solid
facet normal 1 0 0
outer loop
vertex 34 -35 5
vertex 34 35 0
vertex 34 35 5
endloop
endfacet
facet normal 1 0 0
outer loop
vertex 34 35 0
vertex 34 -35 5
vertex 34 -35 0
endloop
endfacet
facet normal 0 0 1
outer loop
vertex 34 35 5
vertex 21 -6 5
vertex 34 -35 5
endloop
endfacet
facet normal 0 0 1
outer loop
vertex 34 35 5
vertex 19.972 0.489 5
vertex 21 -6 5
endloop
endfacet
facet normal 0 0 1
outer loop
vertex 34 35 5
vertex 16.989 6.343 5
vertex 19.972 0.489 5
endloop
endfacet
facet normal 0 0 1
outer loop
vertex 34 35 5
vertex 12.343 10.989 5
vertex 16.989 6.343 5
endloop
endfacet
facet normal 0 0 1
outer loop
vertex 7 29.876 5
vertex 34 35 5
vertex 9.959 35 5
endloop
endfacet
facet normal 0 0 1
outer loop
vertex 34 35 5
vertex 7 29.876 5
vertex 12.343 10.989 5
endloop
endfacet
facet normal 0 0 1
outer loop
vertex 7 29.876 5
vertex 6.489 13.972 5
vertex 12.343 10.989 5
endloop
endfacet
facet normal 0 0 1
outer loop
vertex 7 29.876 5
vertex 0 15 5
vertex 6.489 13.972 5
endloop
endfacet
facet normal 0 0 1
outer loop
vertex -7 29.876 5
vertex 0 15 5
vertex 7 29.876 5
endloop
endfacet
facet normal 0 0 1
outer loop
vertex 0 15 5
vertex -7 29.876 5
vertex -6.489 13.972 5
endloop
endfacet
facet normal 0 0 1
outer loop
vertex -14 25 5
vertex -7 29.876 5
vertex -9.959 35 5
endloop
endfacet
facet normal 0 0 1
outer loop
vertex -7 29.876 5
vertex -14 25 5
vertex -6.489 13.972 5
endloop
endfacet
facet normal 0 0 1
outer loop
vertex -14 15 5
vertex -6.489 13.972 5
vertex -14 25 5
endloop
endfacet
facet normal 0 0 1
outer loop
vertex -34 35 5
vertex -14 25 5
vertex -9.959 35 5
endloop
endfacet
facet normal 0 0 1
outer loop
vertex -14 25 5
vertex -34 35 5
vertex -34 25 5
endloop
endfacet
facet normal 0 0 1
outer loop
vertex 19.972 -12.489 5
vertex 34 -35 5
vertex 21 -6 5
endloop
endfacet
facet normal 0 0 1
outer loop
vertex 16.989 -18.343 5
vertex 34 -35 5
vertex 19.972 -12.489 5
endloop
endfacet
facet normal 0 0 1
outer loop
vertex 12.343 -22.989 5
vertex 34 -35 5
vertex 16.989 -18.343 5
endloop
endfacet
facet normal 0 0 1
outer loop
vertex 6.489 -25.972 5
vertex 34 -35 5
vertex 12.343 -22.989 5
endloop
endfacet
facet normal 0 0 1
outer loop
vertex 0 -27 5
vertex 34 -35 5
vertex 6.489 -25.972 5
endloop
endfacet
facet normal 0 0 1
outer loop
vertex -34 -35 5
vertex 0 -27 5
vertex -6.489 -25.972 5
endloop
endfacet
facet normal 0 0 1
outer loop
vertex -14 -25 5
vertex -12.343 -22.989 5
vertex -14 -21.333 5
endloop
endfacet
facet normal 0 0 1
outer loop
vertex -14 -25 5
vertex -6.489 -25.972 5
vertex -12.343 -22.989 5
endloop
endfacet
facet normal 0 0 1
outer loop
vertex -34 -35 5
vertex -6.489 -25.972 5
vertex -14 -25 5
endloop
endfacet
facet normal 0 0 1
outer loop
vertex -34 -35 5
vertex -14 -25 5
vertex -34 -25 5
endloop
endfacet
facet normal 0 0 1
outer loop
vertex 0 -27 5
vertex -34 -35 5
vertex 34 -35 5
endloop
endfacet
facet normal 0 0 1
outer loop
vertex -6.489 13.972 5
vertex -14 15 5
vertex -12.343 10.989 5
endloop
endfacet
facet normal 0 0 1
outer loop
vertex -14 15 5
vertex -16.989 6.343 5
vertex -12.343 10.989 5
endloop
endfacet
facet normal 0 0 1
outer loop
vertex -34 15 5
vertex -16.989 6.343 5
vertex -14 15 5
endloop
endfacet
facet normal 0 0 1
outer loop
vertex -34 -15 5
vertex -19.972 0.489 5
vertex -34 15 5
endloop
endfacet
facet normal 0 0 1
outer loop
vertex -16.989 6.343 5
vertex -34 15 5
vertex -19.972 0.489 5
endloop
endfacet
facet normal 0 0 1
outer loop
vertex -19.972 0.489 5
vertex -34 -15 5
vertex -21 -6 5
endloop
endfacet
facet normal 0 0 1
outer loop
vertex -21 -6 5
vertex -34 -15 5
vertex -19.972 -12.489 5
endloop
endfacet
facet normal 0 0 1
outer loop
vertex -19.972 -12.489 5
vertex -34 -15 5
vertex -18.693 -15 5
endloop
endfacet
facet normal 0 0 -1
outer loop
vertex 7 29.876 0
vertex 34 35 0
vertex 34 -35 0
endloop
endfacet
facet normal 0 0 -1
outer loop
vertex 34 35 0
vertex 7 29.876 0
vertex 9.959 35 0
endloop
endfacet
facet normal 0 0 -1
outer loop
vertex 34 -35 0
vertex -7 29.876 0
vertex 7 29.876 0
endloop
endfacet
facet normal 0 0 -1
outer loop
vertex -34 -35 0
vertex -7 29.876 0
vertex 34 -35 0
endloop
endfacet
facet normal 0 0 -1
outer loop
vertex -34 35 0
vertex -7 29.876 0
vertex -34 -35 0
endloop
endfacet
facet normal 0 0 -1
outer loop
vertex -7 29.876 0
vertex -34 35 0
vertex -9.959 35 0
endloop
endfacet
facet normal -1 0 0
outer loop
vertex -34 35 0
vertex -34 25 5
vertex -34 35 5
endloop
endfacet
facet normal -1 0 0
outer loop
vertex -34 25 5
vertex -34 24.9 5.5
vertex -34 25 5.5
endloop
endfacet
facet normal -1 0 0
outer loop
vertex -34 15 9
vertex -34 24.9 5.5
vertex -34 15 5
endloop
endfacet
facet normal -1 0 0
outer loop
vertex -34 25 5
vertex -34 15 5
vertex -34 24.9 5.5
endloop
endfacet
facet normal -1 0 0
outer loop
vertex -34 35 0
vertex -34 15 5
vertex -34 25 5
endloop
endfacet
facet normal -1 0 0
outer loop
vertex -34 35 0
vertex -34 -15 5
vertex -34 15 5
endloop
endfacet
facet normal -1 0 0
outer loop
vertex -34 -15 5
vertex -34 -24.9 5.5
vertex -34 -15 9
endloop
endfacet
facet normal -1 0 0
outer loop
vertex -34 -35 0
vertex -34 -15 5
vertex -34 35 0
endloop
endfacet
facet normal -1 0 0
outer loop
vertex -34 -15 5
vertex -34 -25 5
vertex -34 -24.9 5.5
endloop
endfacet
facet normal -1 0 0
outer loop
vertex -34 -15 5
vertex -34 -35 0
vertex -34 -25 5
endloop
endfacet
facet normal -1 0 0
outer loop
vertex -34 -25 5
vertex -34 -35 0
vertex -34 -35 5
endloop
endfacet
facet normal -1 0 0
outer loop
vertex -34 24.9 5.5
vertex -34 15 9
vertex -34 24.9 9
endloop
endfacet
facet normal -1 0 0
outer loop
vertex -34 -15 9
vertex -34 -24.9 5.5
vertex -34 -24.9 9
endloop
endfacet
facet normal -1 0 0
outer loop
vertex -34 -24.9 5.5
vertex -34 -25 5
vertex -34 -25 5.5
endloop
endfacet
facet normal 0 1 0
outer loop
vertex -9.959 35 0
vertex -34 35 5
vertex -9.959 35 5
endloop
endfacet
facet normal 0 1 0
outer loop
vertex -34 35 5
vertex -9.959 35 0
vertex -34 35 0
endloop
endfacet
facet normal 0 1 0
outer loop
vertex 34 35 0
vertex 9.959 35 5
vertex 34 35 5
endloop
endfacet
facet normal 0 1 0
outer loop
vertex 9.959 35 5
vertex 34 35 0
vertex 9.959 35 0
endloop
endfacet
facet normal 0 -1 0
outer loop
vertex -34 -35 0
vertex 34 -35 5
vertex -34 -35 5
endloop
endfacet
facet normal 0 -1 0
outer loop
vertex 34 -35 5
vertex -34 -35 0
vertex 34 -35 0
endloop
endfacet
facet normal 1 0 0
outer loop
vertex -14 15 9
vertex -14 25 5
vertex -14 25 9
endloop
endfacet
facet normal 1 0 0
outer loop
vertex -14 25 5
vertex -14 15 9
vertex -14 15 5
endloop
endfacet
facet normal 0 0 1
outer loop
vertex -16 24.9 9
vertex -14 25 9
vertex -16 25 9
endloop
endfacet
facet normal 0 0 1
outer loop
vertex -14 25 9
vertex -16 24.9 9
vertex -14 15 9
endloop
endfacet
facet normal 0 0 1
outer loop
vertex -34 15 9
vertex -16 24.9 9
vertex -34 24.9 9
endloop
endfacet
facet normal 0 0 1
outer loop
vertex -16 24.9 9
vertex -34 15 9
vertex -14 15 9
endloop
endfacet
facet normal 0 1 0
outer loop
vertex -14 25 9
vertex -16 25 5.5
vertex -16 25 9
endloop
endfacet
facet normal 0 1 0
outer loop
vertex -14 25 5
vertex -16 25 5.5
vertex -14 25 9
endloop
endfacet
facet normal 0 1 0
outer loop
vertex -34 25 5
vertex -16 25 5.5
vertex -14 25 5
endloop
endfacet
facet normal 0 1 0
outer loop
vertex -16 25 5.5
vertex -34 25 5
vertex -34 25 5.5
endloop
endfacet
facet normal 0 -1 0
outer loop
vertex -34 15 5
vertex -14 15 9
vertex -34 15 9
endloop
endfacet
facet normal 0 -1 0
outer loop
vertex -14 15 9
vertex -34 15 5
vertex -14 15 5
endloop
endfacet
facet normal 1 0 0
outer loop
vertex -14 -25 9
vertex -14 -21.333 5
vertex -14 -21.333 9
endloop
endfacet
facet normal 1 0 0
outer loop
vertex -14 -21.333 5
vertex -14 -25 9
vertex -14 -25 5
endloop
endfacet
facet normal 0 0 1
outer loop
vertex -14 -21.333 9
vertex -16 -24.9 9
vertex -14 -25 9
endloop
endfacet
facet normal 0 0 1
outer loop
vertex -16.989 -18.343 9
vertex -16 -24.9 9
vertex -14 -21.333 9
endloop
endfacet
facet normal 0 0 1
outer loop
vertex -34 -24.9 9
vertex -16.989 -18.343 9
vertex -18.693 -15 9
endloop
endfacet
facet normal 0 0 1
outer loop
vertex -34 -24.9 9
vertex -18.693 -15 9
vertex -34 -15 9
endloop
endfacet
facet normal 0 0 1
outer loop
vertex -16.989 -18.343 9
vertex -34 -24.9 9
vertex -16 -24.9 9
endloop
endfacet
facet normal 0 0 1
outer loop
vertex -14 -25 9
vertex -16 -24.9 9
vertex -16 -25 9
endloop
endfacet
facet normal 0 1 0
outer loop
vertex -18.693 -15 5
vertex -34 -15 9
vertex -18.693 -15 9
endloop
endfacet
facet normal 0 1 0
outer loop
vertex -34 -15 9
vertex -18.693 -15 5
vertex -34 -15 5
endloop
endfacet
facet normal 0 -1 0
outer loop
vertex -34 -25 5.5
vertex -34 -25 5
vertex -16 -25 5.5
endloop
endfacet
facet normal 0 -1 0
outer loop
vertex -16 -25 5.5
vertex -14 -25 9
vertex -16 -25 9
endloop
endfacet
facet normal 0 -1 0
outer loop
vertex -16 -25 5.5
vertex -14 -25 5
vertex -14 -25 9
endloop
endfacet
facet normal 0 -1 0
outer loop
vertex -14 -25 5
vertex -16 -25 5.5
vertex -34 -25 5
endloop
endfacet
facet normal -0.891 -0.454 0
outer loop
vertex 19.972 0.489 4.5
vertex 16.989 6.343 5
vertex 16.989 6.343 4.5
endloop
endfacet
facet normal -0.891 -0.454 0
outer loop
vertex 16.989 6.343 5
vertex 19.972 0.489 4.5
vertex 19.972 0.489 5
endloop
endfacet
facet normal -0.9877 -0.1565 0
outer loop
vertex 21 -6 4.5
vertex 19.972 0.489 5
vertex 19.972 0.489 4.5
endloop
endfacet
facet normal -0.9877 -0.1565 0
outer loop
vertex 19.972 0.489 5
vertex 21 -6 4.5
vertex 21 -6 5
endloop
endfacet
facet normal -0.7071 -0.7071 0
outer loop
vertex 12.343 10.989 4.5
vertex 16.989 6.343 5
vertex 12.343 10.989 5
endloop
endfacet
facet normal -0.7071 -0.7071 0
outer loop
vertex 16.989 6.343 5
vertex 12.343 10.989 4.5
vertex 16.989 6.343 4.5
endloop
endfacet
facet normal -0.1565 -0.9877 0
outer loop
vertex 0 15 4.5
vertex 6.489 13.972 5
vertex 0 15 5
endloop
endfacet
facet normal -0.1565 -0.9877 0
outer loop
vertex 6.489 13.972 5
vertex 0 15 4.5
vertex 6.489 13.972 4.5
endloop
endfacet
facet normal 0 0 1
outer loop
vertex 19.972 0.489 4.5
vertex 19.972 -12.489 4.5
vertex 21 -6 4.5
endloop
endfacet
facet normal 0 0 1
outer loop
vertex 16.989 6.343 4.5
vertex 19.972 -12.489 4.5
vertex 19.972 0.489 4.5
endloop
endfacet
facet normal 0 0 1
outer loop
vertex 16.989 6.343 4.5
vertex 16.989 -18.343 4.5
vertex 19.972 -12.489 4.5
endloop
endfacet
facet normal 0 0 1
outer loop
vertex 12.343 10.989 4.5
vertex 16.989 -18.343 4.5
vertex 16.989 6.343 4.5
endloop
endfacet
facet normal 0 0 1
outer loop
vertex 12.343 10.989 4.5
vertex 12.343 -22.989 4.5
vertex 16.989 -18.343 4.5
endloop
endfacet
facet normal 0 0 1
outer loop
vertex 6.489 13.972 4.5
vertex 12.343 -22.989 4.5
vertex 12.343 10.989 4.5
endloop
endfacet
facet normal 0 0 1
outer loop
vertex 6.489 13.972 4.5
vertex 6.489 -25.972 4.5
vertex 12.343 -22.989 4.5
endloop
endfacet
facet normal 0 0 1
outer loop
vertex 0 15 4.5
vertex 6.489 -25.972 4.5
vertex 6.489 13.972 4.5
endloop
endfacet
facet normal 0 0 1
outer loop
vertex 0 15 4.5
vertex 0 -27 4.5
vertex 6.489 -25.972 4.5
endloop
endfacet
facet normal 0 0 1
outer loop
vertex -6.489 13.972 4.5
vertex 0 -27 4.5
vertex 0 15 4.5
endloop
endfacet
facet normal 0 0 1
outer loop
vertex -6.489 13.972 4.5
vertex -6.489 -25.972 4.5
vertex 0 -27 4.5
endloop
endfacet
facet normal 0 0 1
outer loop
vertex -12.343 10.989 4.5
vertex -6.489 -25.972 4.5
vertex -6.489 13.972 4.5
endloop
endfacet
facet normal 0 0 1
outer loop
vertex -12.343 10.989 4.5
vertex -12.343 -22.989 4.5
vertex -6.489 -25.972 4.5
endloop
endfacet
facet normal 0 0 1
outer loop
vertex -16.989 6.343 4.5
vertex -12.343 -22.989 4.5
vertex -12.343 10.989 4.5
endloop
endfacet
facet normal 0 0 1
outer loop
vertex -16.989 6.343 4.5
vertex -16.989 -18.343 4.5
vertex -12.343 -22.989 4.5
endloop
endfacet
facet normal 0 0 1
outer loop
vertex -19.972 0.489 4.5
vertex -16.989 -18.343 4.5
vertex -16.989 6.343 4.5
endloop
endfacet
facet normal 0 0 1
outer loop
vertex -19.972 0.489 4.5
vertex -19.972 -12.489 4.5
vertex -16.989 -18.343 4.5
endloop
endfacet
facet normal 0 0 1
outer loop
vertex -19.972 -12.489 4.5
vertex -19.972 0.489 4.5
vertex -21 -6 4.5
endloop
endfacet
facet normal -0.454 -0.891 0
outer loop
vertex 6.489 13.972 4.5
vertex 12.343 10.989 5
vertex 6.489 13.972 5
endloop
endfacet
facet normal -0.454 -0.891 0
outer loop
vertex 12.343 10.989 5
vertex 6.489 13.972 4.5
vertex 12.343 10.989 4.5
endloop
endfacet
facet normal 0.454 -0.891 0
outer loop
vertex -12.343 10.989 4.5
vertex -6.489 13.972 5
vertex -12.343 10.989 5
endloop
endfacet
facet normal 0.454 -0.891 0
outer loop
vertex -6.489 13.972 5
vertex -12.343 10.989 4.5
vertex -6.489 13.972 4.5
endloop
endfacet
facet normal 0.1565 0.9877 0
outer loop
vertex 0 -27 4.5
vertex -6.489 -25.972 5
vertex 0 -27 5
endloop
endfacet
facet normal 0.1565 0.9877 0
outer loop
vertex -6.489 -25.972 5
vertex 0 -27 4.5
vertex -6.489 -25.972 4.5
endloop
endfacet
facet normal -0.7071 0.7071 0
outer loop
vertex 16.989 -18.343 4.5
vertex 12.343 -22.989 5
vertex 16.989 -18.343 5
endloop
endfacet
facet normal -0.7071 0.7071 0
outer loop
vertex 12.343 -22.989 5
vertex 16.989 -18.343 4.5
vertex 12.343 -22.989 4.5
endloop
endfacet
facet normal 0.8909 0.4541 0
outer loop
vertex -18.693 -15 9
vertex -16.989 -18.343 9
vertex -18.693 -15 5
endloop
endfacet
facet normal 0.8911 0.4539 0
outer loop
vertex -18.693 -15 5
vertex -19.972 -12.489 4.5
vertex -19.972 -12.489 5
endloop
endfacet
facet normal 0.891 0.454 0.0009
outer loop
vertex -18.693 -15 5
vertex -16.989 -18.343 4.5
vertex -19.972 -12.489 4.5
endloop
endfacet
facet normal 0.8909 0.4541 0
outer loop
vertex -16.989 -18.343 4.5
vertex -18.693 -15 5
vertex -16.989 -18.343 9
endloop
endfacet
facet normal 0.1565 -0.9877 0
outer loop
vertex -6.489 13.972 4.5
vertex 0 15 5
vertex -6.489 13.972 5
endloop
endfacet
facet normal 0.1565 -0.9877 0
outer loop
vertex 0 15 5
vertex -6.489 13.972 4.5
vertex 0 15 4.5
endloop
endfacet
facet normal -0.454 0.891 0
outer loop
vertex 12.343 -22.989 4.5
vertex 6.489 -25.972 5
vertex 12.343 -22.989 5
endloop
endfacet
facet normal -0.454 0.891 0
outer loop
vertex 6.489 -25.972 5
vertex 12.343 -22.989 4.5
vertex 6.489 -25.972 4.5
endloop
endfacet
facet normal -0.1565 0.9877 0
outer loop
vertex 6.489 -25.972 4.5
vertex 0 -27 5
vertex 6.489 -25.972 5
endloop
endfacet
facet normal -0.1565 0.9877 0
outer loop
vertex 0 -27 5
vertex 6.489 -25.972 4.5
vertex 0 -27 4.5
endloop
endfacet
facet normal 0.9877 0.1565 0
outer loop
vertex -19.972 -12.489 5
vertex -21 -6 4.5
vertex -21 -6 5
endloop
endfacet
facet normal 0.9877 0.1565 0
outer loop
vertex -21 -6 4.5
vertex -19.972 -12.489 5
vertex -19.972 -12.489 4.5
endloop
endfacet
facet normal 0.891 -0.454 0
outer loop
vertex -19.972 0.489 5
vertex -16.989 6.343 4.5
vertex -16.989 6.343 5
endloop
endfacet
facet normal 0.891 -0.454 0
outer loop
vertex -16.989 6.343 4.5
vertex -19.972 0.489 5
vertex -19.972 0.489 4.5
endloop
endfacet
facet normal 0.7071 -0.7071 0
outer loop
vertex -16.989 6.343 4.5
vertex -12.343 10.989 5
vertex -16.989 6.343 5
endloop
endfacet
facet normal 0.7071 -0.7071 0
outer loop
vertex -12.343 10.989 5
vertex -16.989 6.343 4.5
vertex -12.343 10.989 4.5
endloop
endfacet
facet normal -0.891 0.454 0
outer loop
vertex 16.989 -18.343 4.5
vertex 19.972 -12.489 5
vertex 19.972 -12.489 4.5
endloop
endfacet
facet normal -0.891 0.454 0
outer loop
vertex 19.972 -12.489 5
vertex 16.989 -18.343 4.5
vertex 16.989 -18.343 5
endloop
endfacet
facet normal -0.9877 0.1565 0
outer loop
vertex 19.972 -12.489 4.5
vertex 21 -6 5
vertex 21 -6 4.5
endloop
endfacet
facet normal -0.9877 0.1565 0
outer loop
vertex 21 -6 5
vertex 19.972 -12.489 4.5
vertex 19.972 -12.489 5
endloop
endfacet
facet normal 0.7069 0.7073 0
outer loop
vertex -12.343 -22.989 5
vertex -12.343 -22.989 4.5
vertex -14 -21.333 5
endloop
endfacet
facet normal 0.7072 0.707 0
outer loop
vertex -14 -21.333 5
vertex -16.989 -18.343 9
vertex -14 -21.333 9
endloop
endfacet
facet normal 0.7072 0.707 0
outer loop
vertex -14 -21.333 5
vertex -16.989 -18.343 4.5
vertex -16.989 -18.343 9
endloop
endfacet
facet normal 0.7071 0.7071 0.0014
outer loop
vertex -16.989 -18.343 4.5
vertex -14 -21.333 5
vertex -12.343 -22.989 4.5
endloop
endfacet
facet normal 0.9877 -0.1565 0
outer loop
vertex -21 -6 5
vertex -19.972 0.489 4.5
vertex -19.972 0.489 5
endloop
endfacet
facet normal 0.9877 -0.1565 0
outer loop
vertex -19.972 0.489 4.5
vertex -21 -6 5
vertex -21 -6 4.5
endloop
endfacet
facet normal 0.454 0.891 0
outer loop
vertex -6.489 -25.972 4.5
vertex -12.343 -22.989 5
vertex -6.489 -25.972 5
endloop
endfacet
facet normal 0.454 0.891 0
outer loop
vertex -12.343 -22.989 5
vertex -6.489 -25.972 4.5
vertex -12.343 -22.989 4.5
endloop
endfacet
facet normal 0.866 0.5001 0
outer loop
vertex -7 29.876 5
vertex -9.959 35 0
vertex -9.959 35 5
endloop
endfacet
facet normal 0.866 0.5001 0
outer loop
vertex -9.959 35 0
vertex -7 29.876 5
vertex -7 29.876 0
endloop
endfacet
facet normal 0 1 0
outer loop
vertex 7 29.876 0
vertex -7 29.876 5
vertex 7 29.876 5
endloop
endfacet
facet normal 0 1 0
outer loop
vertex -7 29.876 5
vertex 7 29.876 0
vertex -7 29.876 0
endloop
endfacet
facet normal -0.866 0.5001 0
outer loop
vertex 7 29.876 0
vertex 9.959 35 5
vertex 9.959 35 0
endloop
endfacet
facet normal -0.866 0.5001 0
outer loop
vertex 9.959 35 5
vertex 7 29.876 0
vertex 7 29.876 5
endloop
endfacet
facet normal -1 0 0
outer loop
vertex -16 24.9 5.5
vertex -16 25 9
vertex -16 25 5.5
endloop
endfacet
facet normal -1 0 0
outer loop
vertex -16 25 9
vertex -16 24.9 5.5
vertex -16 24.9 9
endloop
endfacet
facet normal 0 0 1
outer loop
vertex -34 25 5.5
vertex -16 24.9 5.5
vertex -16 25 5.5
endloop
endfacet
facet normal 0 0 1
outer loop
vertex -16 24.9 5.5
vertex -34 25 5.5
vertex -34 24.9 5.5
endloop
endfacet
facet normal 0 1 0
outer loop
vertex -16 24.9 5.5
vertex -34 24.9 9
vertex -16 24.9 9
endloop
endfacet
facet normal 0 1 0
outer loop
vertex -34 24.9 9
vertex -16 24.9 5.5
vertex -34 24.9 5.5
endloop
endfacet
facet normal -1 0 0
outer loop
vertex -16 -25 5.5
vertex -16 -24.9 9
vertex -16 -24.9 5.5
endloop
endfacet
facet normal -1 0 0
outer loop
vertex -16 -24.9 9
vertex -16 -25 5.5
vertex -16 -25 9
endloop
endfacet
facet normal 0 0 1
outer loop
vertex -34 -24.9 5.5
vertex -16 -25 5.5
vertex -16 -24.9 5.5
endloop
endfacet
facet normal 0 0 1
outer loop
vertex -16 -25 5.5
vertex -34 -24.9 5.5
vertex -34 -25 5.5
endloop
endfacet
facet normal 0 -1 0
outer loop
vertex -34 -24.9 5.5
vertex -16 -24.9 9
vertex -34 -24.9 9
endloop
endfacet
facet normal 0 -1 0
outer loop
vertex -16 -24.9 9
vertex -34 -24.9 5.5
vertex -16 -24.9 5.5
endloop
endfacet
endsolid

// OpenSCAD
// file: configuration-metric.scad
// PRUSA Mendel  
// Metric Configuration file
// GNU GPL v2
// Josef Průša
// josefprusa@me.com
// prusadjs.cz
// http://www.reprap.org/wiki/Prusa_Mendel
// http://github.com/prusajr/PrusaMendel

// CONFIGURATION FILE FOR METRIC VARIANT OF PRUSA MENDEL

// M8 rod diameter
m8_diameter = 8.4;

// M8 nut diameter diameter
// Used for $fn nut trick -> cylinder(h = 5, r=m8_nut_diameter, $fn=6, center=true);
m8_nut_diameter = 16.4;

// M4 rod/screw diameter
m4_diameter = 5;

// M4 nut diameter
// Used for $fn nut trick -> cylinder(h = 5, r=m4_nut_diameter, $fn=6, center=true);
m4_nut_diameter = 9;

// M3 rod/screw diameter
m3_diameter = 4.4;

// M3 nut diameter diameter
// Used for $fn nut trick -> cylinder(h = 5, r=m3_nut_diameter, $fn=6, center=true);
m3_nut_diameter = 7;

// Bushing holders diameter
bushing_diameter = 11;

//Motor shaft diameter
motor_shaft=5;

//Bushings
	//Size of rod on which it will slide
	bushing_rodsize = 8;
	
	//Size of whole bushings (diameter because the core is cylinder)
	bushing_outerDiameter = 16;
	
	//How long they are going to be
	bushing_lenght = 11;
	
	// TYPE Can generate three versions
	// 1 - regular old ones
	// 2 - helical ones
	// 3 - holders for brass or any other bought bushings
	bushing_type = 2;
// file: configuration.scad
// PRUSA Mendel  
// Configuration file
// GNU GPL v2
// Josef Průša
// josefprusa@me.com
// prusadjs.cz
// http://www.reprap.org/wiki/Prusa_Mendel
// http://github.com/prusajr/PrusaMendel

// PLESE SELECT ONE OF THE CONFIGURATION FILES
// BY UN-COMMENTING IT

// METRIC VERSION
include <configuration-metric.scad>

// IMPERIAL VERSION (TODO, just place holder)
// Spacexula will do it ;-)
// include <configuration-imperial.scad>

// MINI-HUXLEY VERSION (TODO, just place holder)
// include <configuration-huxley.scad>

// MEGA VERSION (TODO, just place holder)
// include <configuration-mega.scad>
// main file
// PRUSA Mendel  
// X-carriage
// Used for sliding on X axis
// GNU GPL v2
// Josef Průša
// josefprusa@me.com
// prusadjs.cz
// http://www.reprap.org/wiki/Prusa_Mendel
// http://github.com/prusajr/PrusaMendel

include <configuration.scad>

/**
 * @name load tester
 * @using 4 bushing
 * @id loadtester
 */
module xcarriage(){


translate(v = [0,0,2.5]) union(){difference(){
	union(){
		//Base block
			cube(size = [68,70,5], center = true);
		//Nut holder base - extruder
			//translate(v = [0, 0, 1]) cube(size = [12,70,7], center = true);
			//translate(v = [0, -6, 1]) cube(size = [68,12,7], center = true);

		//Nut holder base - belt clamps
		//translate(v = [33-(7.5/2), -18, 1]) cube(size = [45-7.5,15,7], center = true);
		//translate(v = [33+45/2-7.5, -18, 1]) cylinder(h = 7, r=7.5, $fn=18, center=true);
		//translate(v = [33-(7.5/2), 18, 1]) cube(size = [45-7.5,15,7], center = true);
		//translate(v = [33+45/2-7.5, 18, 1]) cylinder(h = 7, r=7.5, $fn=18, center=true);

		//Bushing holder
		//translate(v = [-23, 30, 5])cube(size = [22,10,15], center = true);
		//translate(v = [-23, -30, 5])cube(size = [22,10,15], center = true);
		//translate(v = [23, -30, 5])cube(size = [22,10,15], center = true);
		//translate(v = [23, 30, 5])cube(size = [22,10,15], center = true);
		
		// fan holder
		translate(v = [-24, 20, 2])  cube(size = [20,10,9], center = true);
		translate(v = [-24, -20, 2]) cube(size = [20,10,9], center = true);

	}
	//round corners
	//translate([-34,-35.1,-10]) roundcorner(round_corner_diameter/2);
	//translate([34,-35.1,-10]) rotate(a=90, v=[0,0,1]) roundcorner(round_corner_diameter/2);

	//translate([-34,35.1,-10]) rotate(a=270, v=[0,0,1]) roundcorner(round_corner_diameter/2);
	//translate([34,35.1,-10]) rotate(a=-180, v=[0,0,1]) roundcorner(round_corner_diameter/2);
	
	translate([0,42])cylinder(r=14,h=10,center=true,$fn=6);
translate([0,-6, -4])rotate(a=90, v=[0,0,1])linear_extrude(file = "mdf_half_disk.dxf", 
                     layer = "holes", height = 10, 
                     convexity = 2, $fn=10);
	//main cutout
	//translate(v = [-12.5,0,0]) cube(size = [5,50,10], center = true);

	translate(v = [25.5, 30.4, 8])cube(size = [19,11,10], center = true);
	translate(v = [-25.5, 30.4, 8])cube(size = [19,11,10], center = true);
	translate(v = [25.5, -30.4, 8])cube(size = [19,11,10], center = true);
	translate(v = [-25.5, -30.4, 8])cube(size = [19,11,10], center = true);

	// holes for connecting extruder
		translate(v = [0, 0, 0]) {
		
		translate(v = [-40, -31, 2]) #cylinder(h = 10, r=m4_diameter/2, $fn=9, center=true);
		translate(v = [-40, -31, 5]) #cylinder(h = 9, r=m4_nut_diameter/2, $fn=6, center=true);
		translate(v = [-40, 19, ]) #cylinder(h = 20, r=m4_diameter/2, $fn=9, center=true);
		translate(v = [-40, 19, 5]) #cylinder(h = 9, r=4.5, $fn=6, center=true);
		
		// Hotend hole
		translate(v = [0, -6, 12]) cylinder(h = 20, r=21, $fn=20, center=true);

		

		//translate(v = [-25, -6, 2]) cylinder(h = 10, r=m4_diameter/2, $fn=9, center=true);
		//translate(v = [-25, -6, 5]) cylinder(h = 9, r=m4_nut_diameter/2, $fn=6, center=true);
		//translate(v = [25, -6, ]) cylinder(h = 20, r=m4_diameter/2, $fn=9, center=true);
		//translate(v = [25, -6, 5]) cylinder(h = 9, r=4.5, $fn=6, center=true);
		
		
		
		}
//belt clamp holes
	//translate(v = [30, -18, 2]) cylinder(h = 10, r=m3_diameter/2, $fn=9, center=true);
	//translate(v = [30, -18, 5]) cylinder(h = 9, r=m3_nut_diameter/2, $fn=6, center=true);
	//translate(v = [48, -18, 2]) cylinder(h = 10, r=m3_diameter/2, $fn=9, center=true);
	//translate(v = [48, -18, 5]) cylinder(h = 9, r=m3_nut_diameter/2, $fn=6, center=true);

	//translate(v = [30, 18, 2]) cylinder(h = 10, r=m3_diameter/2, $fn=9, center=true);
	//translate(v = [30, 18, 5]) cylinder(h = 9, r=m3_nut_diameter/2, $fn=6, center=true);
	//translate(v = [48, 18, 2]) cylinder(h = 10, r=m3_diameter/2, $fn=9, center=true);
	//translate(v = [48, 18, 5]) cylinder(h = 9, r=m3_nut_diameter/2, $fn=6, center=true);


		//translate(v = [-25, -20, 2.5]) rotate(a=[0,90,0]) cylinder(h = 30, r=m4_diameter/2, $fn=10, center=true);

		//translate(v = [-25, 20, 2.5]) rotate(a=[0,90,0]) cylinder(h = 30, r=m4_diameter/2, $fn=10, center=true);


}}
}
xcarriage();
